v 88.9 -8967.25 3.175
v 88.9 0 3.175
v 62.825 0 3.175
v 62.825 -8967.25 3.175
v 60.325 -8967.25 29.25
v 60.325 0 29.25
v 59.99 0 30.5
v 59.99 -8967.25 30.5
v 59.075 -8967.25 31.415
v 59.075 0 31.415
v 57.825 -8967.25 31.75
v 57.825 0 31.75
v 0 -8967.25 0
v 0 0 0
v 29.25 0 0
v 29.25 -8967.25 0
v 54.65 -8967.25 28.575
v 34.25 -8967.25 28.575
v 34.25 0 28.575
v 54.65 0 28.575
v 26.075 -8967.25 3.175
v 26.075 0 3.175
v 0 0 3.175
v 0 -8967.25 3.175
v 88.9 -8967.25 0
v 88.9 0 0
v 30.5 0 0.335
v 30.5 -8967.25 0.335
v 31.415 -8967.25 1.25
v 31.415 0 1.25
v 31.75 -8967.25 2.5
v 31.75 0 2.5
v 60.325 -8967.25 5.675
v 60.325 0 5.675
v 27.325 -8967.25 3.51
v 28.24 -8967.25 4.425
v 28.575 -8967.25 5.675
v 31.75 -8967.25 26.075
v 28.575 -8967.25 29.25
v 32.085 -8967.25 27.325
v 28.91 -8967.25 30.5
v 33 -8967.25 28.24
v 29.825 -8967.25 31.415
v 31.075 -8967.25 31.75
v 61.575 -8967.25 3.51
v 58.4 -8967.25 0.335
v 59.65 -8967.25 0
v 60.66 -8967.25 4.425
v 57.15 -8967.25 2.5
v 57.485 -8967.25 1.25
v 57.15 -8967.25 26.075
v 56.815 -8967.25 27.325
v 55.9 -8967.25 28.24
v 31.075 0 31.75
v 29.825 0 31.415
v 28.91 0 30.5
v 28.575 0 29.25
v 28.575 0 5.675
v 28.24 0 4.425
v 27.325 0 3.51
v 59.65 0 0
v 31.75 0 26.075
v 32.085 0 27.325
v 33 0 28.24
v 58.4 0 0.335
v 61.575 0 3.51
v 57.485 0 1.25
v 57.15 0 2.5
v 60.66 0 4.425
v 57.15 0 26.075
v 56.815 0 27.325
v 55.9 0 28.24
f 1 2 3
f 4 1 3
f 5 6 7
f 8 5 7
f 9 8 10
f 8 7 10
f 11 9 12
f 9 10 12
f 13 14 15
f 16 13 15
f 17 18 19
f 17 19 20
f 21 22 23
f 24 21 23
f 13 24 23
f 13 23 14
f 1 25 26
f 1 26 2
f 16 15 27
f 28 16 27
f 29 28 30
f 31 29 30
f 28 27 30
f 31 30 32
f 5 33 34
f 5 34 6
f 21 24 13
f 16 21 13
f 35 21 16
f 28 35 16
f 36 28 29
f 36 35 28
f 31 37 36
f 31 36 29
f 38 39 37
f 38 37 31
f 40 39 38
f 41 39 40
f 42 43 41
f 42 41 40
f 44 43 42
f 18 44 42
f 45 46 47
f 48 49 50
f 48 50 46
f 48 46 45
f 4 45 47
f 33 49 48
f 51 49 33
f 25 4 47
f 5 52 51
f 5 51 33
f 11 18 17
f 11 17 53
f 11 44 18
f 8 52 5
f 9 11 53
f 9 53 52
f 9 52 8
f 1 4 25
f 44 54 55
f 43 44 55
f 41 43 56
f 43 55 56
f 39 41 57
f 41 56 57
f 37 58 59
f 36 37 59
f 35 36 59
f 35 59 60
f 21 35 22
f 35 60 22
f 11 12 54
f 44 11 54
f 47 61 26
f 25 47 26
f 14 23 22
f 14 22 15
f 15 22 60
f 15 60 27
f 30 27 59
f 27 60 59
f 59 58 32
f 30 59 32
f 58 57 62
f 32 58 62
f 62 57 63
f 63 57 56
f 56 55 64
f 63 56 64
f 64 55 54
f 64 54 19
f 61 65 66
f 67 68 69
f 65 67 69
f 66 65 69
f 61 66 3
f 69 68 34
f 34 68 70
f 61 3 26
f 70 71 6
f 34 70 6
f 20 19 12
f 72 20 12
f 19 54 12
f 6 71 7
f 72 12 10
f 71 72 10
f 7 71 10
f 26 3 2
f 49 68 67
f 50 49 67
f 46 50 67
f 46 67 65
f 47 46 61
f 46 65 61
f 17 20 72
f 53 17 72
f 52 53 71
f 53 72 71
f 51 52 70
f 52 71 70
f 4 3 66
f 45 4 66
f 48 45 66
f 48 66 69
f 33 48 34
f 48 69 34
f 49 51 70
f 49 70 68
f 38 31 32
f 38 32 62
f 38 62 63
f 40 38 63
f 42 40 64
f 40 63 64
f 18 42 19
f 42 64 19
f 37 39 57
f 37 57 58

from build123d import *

# Parameters (mm, degrees)
F1_DEPTH = 8967.25


with BuildPart() as f1:
    # F0 (on Front) → F1 (new body)
    with BuildSketch(Plane.XZ):
        with BuildLine():
            Line((0, 3.175), (0, 0))
            Line((0, 0), (29.25, 0))
            ThreePointArc((29.25, 0), (31.017767, 0.732233), (31.75, 2.5))
            Line((31.75, 2.5), (31.75, 26.075))
            ThreePointArc((31.75, 26.075), (32.482233, 27.842767), (34.25, 28.575))
            Line((34.25, 28.575), (54.65, 28.575))
            ThreePointArc((54.65, 28.575), (56.417767, 27.842767), (57.15, 26.075))
            Line((57.15, 26.075), (57.15, 2.5))
            ThreePointArc((57.15, 2.5), (57.882233, 0.732233), (59.65, 0))
            Line((59.65, 0), (88.9, 0))
            Line((88.9, 0), (88.9, 3.175))
            Line((88.9, 3.175), (62.825, 3.175))
            ThreePointArc((62.825, 3.175), (61.057233, 3.907233), (60.325, 5.675))
            Line((60.325, 5.675), (60.325, 29.25))
            ThreePointArc((60.325, 29.25), (59.592767, 31.017767), (57.825, 31.75))
            Line((57.825, 31.75), (31.075, 31.75))
            ThreePointArc((31.075, 31.75), (29.307233, 31.017767), (28.575, 29.25))
            Line((28.575, 29.25), (28.575, 5.675))
            ThreePointArc((28.575, 5.675), (27.842767, 3.907233), (26.075, 3.175))
            Line((26.075, 3.175), (0, 3.175))
        make_face()
    extrude(amount=F1_DEPTH)


solid = f1.part
